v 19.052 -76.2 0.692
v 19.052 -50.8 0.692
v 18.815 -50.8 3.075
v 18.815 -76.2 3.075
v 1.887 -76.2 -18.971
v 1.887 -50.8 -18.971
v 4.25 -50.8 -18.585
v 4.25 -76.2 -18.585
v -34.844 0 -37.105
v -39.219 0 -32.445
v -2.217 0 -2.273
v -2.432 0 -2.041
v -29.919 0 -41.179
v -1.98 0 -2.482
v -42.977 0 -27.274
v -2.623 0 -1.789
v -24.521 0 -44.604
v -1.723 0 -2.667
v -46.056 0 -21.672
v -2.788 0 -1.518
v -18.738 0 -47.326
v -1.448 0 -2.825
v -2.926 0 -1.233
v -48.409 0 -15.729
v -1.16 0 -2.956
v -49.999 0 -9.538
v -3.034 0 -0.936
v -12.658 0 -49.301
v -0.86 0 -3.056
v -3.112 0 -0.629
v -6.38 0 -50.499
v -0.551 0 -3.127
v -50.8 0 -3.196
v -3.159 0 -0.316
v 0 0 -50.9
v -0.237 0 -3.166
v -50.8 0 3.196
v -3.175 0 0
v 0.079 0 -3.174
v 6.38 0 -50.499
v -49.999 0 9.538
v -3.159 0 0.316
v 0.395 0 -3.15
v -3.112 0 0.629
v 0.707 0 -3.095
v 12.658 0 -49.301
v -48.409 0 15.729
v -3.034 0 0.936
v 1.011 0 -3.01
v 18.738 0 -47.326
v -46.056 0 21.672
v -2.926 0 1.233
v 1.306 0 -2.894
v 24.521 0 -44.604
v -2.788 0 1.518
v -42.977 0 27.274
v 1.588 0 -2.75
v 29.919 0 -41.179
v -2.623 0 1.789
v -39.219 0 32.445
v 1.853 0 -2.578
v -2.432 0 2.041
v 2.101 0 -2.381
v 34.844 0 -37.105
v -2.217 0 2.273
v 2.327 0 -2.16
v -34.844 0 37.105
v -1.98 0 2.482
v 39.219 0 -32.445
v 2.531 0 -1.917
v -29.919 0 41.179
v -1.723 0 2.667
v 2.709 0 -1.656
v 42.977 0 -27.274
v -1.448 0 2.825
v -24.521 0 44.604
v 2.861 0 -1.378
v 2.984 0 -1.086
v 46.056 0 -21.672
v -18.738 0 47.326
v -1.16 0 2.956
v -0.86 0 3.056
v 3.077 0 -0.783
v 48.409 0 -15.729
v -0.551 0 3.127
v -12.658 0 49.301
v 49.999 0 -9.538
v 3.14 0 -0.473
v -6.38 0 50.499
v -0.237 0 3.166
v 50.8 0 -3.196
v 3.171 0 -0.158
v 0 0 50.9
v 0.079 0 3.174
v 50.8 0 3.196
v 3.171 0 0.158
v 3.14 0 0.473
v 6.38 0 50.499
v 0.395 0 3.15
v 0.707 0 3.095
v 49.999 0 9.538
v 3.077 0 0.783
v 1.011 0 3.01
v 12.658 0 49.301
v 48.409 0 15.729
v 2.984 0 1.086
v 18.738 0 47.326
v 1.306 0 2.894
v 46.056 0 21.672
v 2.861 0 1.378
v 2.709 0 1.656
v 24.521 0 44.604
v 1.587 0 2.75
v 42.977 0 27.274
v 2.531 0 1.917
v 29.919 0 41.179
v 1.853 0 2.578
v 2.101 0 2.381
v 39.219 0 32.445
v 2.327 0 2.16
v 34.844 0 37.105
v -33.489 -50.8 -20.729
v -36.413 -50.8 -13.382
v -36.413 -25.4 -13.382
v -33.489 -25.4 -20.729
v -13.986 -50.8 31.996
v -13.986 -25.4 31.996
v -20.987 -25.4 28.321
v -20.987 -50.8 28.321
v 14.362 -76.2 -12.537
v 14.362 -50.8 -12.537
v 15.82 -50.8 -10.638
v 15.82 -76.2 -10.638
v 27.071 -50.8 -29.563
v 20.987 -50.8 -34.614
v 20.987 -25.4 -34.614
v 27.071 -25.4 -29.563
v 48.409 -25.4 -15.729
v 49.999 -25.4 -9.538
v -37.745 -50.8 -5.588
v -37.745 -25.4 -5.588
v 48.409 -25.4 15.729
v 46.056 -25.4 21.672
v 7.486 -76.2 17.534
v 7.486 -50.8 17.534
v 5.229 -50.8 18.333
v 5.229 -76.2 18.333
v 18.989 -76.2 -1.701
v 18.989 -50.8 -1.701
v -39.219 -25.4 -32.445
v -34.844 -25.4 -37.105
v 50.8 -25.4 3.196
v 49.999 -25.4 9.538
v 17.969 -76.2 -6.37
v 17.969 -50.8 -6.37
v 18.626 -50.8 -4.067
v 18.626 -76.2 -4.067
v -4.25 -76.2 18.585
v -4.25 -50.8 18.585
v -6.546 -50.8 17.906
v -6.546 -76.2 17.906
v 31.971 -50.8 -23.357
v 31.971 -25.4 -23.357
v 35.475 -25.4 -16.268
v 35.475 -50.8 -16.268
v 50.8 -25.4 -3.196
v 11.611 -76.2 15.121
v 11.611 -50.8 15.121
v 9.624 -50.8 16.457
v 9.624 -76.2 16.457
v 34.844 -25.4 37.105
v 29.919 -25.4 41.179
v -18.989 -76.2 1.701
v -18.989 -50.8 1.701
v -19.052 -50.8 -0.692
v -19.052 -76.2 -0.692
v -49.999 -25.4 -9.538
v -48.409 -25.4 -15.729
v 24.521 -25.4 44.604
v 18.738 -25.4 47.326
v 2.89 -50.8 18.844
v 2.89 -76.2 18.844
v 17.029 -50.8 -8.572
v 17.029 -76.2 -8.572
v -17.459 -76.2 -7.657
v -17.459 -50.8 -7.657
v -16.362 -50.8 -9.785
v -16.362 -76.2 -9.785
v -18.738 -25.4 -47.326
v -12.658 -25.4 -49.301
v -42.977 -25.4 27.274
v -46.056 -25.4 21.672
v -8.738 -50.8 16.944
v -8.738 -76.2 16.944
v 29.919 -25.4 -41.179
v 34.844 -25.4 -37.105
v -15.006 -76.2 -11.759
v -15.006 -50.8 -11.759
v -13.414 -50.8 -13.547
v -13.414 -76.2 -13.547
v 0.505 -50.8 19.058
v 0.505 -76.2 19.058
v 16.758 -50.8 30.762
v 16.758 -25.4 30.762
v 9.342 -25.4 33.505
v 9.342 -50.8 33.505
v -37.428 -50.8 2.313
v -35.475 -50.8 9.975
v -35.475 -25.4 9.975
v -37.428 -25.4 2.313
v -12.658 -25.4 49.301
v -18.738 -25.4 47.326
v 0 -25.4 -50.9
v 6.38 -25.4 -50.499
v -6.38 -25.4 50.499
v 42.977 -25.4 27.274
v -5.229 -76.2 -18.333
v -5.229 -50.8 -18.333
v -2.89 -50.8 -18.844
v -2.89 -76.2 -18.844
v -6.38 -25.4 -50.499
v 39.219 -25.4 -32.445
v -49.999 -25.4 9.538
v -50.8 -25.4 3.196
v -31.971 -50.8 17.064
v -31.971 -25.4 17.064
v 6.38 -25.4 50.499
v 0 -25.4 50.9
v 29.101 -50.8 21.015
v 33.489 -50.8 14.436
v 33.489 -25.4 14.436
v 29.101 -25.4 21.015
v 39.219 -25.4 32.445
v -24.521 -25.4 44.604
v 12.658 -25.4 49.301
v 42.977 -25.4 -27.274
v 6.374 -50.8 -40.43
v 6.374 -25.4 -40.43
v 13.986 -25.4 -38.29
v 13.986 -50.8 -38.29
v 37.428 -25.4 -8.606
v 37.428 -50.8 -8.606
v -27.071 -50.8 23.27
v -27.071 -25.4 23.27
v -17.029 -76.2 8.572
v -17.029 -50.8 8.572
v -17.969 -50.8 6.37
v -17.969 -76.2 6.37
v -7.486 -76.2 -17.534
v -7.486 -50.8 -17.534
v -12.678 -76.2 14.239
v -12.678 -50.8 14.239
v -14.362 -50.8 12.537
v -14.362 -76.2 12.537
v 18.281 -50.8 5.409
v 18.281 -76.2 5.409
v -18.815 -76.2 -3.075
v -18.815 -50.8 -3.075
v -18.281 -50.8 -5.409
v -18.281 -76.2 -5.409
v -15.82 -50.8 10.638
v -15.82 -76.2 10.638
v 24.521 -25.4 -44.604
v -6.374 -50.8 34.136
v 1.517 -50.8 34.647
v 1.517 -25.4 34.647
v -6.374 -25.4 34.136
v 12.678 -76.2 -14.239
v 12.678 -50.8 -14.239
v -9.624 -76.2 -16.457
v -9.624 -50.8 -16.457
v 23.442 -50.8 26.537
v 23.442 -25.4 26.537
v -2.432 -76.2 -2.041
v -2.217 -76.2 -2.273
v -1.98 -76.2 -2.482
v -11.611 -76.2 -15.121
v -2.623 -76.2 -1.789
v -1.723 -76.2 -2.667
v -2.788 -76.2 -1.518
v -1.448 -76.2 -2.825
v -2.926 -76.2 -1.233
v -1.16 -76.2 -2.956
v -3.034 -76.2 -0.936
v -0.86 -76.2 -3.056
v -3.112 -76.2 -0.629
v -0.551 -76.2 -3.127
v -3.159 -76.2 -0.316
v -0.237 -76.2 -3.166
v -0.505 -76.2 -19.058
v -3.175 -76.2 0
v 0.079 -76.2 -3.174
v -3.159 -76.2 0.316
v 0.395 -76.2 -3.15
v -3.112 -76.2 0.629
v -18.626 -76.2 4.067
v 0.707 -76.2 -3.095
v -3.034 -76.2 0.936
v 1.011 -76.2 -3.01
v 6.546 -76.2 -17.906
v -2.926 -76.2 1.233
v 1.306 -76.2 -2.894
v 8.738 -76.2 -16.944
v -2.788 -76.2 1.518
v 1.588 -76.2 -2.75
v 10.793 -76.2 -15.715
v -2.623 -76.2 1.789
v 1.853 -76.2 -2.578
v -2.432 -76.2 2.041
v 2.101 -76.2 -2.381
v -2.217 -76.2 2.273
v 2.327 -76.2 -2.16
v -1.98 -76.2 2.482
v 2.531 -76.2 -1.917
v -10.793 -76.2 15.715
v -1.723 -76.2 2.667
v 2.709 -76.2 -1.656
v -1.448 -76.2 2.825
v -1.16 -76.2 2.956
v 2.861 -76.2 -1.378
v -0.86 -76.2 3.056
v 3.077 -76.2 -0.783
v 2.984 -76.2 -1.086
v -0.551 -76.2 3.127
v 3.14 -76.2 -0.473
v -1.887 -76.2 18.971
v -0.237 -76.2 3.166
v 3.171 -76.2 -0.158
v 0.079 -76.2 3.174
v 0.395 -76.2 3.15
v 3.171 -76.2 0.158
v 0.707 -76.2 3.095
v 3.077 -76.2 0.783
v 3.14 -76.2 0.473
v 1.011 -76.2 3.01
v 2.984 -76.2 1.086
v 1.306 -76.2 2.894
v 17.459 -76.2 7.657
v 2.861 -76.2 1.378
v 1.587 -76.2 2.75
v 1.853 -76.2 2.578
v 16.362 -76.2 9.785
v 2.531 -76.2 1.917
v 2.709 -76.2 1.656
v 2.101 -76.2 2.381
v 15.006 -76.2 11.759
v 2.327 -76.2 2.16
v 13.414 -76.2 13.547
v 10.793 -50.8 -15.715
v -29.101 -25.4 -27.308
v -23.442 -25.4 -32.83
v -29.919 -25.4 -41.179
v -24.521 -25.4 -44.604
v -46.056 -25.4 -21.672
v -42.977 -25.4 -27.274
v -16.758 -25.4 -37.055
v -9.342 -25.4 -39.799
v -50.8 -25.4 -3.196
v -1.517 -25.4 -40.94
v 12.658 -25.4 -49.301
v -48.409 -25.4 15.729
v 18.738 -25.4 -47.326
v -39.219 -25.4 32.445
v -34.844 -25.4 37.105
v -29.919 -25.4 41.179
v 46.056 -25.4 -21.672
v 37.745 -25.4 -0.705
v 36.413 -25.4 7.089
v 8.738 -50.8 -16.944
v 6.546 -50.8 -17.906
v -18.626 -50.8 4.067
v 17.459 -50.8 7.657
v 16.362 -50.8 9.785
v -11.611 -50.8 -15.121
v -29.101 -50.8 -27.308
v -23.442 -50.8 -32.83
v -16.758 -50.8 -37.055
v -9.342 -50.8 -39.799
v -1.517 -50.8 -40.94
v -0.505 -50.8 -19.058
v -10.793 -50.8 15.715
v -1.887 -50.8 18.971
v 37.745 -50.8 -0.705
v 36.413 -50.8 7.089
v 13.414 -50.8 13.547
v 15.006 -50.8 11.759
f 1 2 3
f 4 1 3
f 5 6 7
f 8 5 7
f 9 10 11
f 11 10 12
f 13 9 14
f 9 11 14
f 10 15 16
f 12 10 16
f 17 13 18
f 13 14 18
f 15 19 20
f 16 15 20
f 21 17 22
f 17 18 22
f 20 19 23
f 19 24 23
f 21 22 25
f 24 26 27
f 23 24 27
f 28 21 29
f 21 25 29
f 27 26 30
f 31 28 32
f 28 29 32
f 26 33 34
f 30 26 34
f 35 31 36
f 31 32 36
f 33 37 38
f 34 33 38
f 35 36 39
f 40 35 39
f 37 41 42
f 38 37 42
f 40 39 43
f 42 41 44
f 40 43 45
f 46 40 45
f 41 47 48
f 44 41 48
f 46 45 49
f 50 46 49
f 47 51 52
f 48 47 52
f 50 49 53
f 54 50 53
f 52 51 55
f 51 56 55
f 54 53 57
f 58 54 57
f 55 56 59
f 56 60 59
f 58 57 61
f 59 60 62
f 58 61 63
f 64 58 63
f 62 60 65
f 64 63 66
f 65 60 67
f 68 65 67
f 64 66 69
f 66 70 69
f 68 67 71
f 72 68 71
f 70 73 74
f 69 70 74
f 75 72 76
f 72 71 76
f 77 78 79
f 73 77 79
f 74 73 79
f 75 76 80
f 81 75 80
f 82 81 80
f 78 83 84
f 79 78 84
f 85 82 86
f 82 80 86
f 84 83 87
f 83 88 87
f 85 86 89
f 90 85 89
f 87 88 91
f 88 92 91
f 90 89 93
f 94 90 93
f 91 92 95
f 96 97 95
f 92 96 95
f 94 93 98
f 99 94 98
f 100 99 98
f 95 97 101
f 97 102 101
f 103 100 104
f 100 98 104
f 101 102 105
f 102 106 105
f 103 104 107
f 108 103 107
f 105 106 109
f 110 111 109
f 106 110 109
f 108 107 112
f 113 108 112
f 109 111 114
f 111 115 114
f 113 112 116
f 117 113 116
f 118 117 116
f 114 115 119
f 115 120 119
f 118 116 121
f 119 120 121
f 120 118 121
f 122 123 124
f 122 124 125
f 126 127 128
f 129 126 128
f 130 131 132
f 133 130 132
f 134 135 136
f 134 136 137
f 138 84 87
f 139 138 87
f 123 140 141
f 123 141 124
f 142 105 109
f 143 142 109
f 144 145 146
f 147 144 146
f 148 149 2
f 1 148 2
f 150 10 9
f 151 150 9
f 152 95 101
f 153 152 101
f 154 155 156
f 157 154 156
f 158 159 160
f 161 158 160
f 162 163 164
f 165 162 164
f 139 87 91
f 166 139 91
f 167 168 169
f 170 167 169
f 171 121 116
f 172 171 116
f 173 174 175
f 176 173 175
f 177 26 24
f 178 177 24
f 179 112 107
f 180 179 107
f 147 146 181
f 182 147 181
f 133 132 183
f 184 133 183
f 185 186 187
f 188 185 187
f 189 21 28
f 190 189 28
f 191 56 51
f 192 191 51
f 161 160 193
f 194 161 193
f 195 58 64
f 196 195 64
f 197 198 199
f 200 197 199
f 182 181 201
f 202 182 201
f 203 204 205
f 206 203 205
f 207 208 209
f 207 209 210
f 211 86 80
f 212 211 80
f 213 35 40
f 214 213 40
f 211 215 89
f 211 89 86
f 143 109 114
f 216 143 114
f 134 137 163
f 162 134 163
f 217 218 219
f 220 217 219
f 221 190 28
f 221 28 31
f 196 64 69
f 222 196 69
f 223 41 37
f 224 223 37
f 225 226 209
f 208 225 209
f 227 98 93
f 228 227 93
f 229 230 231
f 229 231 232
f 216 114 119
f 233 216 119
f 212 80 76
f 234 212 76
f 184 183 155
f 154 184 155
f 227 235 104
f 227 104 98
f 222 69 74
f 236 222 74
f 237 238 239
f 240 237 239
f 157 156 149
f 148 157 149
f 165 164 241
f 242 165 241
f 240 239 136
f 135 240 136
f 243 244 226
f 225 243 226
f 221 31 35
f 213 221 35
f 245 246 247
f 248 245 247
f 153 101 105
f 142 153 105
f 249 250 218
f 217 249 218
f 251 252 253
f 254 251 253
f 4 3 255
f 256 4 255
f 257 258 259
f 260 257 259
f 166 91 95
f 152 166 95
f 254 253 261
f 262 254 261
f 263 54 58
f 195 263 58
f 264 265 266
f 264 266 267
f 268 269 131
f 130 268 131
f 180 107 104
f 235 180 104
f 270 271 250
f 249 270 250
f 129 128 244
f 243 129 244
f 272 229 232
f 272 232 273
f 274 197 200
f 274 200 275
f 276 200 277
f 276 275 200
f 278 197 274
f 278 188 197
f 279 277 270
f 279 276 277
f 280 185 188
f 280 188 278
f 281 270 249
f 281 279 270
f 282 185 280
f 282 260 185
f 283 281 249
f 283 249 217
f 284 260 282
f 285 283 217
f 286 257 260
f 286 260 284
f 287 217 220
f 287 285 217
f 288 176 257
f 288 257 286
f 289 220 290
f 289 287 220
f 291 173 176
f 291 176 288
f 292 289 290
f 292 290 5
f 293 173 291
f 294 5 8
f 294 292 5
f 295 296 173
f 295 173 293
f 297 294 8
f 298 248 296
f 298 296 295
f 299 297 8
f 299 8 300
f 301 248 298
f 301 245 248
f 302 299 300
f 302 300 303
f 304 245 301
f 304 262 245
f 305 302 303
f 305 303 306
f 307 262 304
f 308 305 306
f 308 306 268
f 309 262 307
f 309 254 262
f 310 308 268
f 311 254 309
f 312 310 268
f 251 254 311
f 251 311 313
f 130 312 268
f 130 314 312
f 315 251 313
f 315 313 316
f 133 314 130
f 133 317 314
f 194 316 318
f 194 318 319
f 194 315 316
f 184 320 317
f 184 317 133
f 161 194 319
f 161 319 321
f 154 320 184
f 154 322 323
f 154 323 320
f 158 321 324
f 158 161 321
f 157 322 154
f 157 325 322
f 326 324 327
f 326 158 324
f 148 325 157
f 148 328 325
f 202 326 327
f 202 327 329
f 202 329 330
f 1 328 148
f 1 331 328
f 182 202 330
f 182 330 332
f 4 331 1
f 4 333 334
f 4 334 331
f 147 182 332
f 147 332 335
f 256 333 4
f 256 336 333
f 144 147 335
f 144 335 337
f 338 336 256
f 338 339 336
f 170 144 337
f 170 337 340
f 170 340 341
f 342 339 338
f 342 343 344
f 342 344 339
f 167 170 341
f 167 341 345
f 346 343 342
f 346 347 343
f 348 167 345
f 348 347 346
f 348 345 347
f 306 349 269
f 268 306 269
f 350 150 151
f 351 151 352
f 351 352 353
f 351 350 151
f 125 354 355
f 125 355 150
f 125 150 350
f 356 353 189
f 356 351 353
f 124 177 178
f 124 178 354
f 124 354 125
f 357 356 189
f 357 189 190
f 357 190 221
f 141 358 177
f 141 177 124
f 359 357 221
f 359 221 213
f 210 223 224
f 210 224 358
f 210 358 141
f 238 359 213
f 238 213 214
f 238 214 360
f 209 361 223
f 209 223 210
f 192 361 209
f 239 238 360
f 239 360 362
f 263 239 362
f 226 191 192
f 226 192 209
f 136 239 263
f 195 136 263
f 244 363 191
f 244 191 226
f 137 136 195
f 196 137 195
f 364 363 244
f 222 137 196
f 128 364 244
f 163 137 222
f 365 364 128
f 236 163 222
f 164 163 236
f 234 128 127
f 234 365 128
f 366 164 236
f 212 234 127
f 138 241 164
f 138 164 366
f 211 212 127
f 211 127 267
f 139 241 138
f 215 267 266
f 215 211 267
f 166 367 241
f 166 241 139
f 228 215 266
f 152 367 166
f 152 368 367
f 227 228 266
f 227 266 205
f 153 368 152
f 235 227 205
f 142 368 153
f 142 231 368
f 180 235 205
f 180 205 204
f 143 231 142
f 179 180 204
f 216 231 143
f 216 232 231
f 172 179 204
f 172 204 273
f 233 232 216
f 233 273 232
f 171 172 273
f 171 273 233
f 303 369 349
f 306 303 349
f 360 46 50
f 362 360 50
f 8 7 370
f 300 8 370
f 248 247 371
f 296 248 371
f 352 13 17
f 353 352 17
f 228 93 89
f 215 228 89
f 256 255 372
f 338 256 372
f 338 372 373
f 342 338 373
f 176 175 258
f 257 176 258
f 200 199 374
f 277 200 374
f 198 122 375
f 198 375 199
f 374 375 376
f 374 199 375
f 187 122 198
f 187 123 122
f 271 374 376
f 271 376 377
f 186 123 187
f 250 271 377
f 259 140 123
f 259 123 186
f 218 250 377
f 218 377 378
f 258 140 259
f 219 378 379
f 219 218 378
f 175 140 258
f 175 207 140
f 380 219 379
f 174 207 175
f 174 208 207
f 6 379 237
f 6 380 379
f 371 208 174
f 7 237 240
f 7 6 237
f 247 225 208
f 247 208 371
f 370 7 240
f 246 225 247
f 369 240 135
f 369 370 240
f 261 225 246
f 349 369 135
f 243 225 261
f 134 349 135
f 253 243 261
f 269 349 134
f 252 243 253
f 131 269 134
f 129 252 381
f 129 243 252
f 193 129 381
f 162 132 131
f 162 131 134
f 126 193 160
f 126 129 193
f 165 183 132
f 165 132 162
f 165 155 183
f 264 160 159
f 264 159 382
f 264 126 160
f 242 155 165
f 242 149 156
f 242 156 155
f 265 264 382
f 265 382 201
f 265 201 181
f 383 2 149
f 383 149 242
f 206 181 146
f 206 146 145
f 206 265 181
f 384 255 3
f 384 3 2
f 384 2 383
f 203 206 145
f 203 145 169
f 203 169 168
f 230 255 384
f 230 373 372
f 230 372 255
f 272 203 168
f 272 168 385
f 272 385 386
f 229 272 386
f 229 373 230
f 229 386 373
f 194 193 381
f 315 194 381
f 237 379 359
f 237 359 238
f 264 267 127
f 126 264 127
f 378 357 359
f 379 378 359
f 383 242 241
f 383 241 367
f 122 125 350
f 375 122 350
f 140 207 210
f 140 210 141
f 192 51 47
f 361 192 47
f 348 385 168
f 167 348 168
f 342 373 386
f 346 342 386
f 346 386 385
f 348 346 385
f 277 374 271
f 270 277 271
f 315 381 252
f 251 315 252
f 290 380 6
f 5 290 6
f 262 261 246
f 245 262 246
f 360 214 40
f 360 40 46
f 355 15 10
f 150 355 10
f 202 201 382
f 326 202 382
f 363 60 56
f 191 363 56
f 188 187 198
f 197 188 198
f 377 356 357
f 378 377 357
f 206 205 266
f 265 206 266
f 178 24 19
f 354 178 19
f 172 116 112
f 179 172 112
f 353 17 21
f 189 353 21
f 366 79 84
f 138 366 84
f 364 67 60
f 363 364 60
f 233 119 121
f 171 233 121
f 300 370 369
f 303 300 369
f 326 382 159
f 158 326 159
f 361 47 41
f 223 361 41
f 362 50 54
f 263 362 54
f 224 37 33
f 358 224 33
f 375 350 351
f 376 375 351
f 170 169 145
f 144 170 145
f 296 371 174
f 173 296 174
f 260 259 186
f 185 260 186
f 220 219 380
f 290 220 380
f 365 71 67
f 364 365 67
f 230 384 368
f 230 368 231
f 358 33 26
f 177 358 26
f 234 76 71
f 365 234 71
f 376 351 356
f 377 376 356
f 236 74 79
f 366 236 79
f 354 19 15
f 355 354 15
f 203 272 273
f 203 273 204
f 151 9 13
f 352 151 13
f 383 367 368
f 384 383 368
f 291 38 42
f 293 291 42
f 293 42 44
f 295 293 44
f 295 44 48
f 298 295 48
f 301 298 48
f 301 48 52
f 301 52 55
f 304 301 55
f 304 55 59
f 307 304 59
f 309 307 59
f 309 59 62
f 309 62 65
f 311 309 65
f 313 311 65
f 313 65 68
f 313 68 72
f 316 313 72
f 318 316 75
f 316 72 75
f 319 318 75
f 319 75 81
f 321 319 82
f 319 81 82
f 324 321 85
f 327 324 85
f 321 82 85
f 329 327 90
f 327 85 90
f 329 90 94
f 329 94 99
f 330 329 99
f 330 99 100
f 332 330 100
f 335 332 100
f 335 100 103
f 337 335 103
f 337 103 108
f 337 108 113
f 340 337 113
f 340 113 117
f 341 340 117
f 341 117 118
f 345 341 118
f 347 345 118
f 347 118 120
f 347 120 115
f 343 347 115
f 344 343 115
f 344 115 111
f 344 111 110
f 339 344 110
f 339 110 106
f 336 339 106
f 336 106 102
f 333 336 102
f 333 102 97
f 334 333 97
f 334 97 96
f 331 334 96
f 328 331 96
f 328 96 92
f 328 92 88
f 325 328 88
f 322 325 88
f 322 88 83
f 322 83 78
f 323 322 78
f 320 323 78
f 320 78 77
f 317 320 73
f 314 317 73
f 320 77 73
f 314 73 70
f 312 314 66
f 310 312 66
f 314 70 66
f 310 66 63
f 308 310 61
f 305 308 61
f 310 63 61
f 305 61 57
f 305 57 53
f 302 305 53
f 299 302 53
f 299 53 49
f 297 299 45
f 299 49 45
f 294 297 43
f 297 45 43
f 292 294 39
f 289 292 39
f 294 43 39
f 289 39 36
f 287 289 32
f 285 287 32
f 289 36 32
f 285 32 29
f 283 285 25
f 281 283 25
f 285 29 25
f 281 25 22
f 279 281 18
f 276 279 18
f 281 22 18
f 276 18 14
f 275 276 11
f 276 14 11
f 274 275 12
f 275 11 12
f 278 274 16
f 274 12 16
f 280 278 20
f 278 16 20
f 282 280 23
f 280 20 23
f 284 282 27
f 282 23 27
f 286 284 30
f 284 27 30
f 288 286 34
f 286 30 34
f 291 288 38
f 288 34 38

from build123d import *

# Parameters (mm, degrees)
F1_DEPTH = 25.4
F3_DEPTH = 25.4
F5_DEPTH = 25.4
F7_D     = 6.35


with BuildPart() as f1:
    # F0 (on Front) → F1 (new body)
    with BuildSketch(Plane.XZ):
        Polygon((50.8, -3.196065), (50.8, 3.196065), (49.998854, 9.537791), (48.409196, 15.729101), (46.056095, 21.672353), (42.976663, 27.27382), (39.219463, 32.445162), (34.843749, 37.104824), (29.918528, 41.179321), (24.521474, 44.604396), (18.737702, 47.326033), (12.658425, 49.301309), (6.379517, 50.499075), (0, 50.90044), (-6.379517, 50.499075), (-12.658425, 49.301309), (-18.737702, 47.326033), (-24.521474, 44.604396), (-29.918528, 41.179321), (-34.843749, 37.104824), (-39.219463, 32.445162), (-42.976663, 27.27382), (-46.056095, 21.672353), (-48.409196, 15.729101), (-49.998854, 9.537791), (-50.8, 3.196065), (-50.8, -3.196065), (-49.998854, -9.537791), (-48.409196, -15.729101), (-46.056095, -21.672353), (-42.976663, -27.27382), (-39.219463, -32.445162), (-34.843749, -37.104824), (-29.918528, -41.179321), (-24.521474, -44.604396), (-18.737702, -47.326033), (-12.658425, -49.301309), (-6.379517, -50.499075), (0, -50.90044), (6.379517, -50.499075), (12.658425, -49.301309), (18.737702, -47.326033), (24.521474, -44.604396), (29.918528, -41.179321), (34.843749, -37.104824), (39.219463, -32.445162), (42.976663, -27.27382), (46.056095, -21.672353), (48.409196, -15.729101), (49.998854, -9.537791), align=None)
    extrude(amount=F1_DEPTH)

    # F2 (on face) → F3 (join)
    with BuildSketch(Plane.XZ.offset(25.4)):
        Polygon((31.971438, -23.357266), (35.474816, -16.268379), (37.427775, -8.606008), (37.744961, -0.705035), (36.412511, 7.08923), (33.488659, 14.436139), (29.101192, 21.014597), (23.441863, 26.537095), (16.758013, 30.762272), (9.341757, 33.505468), (1.517221, 34.646793), (-6.373624, 34.136364), (-13.985912, 31.996491), (-20.986948, 28.320695), (-27.070754, 23.269627), (-31.971438, 17.064043), (-35.474816, 9.975156), (-37.427775, 2.312784), (-37.744961, -5.588189), (-36.412511, -13.382453), (-33.488659, -20.729362), (-29.101192, -27.30782), (-23.441863, -32.830318), (-16.758013, -37.055495), (-9.341757, -39.798691), (-1.517221, -40.940016), (6.373624, -40.429587), (13.985912, -38.289714), (20.986948, -34.613918), (27.070754, -29.56285), align=None)
    extrude(amount=F3_DEPTH)

    # F4 (on face) → F5 (join)
    with BuildSketch(Plane.XZ.offset(50.8)):
        Polygon((15.820324, -10.638391), (17.02892, -8.571692), (17.96896, -6.369812), (18.625619, -4.067476), (18.98854, -1.700994), (19.052001, 0.692314), (18.815, 3.074704), (18.281276, 5.408604), (17.459245, 7.657207), (16.361871, 9.785051), (15.006461, 11.758579), (13.414389, 13.546667), (11.610765, 15.121116), (9.624033, 16.457097), (7.485523, 17.533539), (5.228962, 18.333466), (2.889938, 18.844264), (0.505337, 19.057877), (-1.887233, 18.970935), (-4.25004, 18.584811), (-6.545822, 17.905593), (-8.738372, 16.943993), (-10.793113, 15.715176), (-12.677639, 14.238521), (-14.362232, 12.537317), (-15.820324, 10.638391), (-17.02892, 8.571692), (-17.96896, 6.369812), (-18.625619, 4.067476), (-18.98854, 1.700994), (-19.052001, -0.692314), (-18.815, -3.074704), (-18.281276, -5.408604), (-17.459245, -7.657207), (-16.361871, -9.785051), (-15.006461, -11.758579), (-13.414389, -13.546667), (-11.610765, -15.121116), (-9.624033, -16.457097), (-7.485523, -17.533539), (-5.228962, -18.333466), (-2.889938, -18.844264), (-0.505337, -19.057877), (1.887233, -18.970935), (4.25004, -18.584811), (6.545822, -17.905593), (8.738372, -16.943993), (10.793113, -15.715176), (12.677639, -14.238521), (14.362232, -12.537317), align=None)
    extrude(amount=F5_DEPTH)

    # F7 (through all)
    with Locations(Plane.XZ.offset(76.2)):
        with Locations((0, 0)):
            Hole(F7_D / 2)


solid = f1.part
